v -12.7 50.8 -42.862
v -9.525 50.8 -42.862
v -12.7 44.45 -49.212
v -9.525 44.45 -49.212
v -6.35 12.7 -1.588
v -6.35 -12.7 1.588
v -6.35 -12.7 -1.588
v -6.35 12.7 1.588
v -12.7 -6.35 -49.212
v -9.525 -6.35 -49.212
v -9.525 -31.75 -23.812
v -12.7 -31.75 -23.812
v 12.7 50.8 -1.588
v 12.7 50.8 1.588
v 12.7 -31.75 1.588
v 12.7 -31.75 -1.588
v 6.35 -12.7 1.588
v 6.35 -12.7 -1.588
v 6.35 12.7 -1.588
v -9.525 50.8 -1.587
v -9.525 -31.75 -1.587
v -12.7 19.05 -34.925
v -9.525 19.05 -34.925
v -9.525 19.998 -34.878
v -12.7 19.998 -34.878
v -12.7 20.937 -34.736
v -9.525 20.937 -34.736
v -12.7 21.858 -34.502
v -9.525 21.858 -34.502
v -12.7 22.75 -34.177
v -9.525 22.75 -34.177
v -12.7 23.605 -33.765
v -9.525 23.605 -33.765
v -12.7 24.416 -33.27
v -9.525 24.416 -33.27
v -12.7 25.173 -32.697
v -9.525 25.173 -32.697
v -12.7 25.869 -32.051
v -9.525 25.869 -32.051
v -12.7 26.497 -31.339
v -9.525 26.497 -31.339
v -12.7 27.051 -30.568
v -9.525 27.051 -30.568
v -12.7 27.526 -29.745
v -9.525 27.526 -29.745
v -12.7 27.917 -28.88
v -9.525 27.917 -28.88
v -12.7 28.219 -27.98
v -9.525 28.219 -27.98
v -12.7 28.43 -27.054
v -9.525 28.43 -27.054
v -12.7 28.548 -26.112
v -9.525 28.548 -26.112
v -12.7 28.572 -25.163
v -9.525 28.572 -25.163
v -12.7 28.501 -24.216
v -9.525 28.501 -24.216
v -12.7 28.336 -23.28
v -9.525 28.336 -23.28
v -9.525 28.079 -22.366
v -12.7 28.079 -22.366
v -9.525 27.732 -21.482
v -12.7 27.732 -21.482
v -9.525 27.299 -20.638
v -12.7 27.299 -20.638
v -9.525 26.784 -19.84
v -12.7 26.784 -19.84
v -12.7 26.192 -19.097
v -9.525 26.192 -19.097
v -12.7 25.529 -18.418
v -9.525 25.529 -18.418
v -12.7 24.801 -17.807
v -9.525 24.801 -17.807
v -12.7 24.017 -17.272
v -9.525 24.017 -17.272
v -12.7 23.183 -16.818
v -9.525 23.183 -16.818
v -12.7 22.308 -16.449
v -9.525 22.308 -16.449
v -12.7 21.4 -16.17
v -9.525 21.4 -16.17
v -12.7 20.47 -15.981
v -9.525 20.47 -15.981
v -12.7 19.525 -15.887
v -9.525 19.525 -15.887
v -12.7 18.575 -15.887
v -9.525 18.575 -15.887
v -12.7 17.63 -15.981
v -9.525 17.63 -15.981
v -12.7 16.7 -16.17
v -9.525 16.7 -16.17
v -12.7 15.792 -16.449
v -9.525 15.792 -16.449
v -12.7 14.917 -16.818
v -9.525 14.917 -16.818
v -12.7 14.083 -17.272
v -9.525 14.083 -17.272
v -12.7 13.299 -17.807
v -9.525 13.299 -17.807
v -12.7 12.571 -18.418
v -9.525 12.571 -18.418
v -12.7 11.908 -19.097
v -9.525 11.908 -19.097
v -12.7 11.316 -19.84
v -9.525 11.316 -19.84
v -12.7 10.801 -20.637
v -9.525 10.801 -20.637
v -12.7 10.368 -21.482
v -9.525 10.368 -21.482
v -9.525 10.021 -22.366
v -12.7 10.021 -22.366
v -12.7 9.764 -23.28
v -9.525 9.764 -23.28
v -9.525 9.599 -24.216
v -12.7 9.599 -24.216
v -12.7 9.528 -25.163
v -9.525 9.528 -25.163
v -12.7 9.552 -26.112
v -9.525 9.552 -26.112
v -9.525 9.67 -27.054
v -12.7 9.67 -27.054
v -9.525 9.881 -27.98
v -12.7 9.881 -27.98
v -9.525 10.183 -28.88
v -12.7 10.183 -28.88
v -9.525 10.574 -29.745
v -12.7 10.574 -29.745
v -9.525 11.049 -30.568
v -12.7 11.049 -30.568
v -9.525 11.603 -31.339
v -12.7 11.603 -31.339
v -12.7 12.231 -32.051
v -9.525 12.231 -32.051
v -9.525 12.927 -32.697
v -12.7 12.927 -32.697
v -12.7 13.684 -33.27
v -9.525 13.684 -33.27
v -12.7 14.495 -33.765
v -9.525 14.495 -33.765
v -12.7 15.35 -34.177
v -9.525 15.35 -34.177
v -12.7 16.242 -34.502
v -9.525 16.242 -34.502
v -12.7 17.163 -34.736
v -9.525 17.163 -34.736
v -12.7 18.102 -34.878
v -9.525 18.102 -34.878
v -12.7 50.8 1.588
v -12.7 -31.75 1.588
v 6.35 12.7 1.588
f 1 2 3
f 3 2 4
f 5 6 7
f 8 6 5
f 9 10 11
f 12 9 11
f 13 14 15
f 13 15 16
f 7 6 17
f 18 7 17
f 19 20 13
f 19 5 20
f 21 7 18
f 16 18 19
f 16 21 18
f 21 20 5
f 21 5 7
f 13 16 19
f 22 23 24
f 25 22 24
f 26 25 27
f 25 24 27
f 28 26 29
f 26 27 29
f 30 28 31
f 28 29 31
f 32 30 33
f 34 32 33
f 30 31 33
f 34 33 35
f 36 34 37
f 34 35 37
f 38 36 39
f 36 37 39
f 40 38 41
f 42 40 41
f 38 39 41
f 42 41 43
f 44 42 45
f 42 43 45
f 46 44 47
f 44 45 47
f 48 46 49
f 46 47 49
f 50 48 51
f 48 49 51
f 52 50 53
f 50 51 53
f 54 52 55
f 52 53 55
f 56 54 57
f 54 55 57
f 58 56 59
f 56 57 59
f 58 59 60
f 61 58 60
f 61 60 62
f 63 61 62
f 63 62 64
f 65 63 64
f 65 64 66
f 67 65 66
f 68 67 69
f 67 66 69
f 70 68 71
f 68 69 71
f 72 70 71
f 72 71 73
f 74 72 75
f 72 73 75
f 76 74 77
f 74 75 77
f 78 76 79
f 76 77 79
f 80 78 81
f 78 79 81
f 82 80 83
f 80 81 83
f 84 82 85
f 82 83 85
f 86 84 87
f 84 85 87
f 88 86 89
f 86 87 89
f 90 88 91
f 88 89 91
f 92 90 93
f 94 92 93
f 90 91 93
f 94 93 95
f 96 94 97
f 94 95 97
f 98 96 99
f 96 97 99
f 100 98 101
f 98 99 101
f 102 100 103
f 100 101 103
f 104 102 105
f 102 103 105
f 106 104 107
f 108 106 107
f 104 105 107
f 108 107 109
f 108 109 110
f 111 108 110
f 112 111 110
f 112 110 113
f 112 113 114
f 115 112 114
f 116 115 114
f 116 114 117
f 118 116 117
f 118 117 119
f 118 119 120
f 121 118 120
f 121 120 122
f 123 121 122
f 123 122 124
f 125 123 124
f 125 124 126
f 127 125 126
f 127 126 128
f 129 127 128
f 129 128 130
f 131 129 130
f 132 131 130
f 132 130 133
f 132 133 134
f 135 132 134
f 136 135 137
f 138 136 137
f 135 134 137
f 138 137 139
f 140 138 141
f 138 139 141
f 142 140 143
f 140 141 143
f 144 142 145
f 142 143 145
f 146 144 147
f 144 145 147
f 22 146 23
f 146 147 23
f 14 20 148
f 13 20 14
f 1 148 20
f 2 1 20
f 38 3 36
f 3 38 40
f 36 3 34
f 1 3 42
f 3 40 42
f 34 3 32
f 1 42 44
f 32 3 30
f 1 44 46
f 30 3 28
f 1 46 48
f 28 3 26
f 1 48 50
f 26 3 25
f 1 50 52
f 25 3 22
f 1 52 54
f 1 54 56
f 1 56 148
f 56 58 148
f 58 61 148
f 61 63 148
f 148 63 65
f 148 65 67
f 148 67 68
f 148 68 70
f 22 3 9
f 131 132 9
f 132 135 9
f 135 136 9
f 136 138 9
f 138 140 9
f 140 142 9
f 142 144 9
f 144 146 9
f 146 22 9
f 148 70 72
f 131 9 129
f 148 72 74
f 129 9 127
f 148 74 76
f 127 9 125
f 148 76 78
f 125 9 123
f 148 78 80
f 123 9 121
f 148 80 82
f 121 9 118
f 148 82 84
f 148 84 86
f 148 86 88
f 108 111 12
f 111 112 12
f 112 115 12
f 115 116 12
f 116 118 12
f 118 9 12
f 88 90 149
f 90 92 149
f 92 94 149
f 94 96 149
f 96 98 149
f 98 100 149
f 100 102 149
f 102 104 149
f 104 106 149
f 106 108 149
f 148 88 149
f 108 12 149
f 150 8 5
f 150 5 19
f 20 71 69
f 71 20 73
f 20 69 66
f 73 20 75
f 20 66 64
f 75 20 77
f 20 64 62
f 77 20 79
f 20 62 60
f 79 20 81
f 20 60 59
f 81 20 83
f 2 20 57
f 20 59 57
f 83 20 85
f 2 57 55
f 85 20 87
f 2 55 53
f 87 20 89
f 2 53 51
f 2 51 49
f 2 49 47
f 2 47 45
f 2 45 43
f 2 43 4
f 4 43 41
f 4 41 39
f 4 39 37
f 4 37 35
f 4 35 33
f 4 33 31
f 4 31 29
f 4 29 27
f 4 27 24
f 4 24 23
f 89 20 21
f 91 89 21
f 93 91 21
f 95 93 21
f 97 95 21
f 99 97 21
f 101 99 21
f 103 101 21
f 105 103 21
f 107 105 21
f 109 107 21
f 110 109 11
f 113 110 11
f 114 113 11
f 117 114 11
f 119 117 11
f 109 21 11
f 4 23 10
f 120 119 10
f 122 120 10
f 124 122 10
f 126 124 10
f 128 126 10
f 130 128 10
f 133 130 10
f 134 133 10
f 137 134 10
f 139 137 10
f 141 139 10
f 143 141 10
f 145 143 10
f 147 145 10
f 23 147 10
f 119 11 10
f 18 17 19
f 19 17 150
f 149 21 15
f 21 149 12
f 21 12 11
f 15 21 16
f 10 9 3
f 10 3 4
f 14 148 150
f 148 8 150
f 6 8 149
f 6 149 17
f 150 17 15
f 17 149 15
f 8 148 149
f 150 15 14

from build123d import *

# Parameters (mm, degrees)
BOSS_EXTRUDE1_DEPTH      = 50.8
BOSS_EXTRUDE1_DEPTH_BACK = 31.75
SKETCH1_W                = 22.225
SKETCH1_H                = 3.175
SKETCH1_W_2              = 3.175
SKETCH1_H_2              = 47.625
SKETCH2_R                = 9.525
CUT_EXTRUDE1_DEPTH       = 3.175
SKETCH3_W                = 12.7
SKETCH3_H                = 25.4
CUT_EXTRUDE2_DEPTH       = 3.175


with BuildPart() as part:
    # Sketch1 → Boss-Extrude1 (new, two sides: drawn at the far end of the back side and taken through both)
    with BuildSketch(Plane(origin=(0, 0, 0), x_dir=(1, 0, 0), z_dir=(0, 1, 0)).offset(-BOSS_EXTRUDE1_DEPTH_BACK)):
        with Locations((1.5875, 0)):
            Rectangle(SKETCH1_W, SKETCH1_H)
        with Locations((-11.1125, 25.4)):
            Rectangle(SKETCH1_W_2, SKETCH1_H_2)
        with Locations((-11.1125, 0)):
            Rectangle(SKETCH1_W_2, SKETCH1_H)
    extrude(amount=BOSS_EXTRUDE1_DEPTH + BOSS_EXTRUDE1_DEPTH_BACK)

    # Sketch2 → Cut-Extrude1 (cut)
    with BuildSketch(Plane(origin=(-9.525, 0, 0), x_dir=(0, 0, -1), z_dir=(1, 0, 0))):
        with Locations((25.4, 19.05)):
            Circle(SKETCH2_R)
        Polygon((42.8625, 50.8), (49.2125, 44.45), (49.2125, 50.8), align=None)
        Polygon((23.8125, -31.75), (49.2125, -31.75), (49.2125, -6.35), align=None)
    extrude(amount=-CUT_EXTRUDE1_DEPTH, mode=Mode.SUBTRACT)

    # Sketch3 → Cut-Extrude2 (cut)
    with BuildSketch(Plane.XY.offset(1.5875)):
        Rectangle(SKETCH3_W, SKETCH3_H)
    extrude(amount=-CUT_EXTRUDE2_DEPTH, mode=Mode.SUBTRACT)


solid = part.part
